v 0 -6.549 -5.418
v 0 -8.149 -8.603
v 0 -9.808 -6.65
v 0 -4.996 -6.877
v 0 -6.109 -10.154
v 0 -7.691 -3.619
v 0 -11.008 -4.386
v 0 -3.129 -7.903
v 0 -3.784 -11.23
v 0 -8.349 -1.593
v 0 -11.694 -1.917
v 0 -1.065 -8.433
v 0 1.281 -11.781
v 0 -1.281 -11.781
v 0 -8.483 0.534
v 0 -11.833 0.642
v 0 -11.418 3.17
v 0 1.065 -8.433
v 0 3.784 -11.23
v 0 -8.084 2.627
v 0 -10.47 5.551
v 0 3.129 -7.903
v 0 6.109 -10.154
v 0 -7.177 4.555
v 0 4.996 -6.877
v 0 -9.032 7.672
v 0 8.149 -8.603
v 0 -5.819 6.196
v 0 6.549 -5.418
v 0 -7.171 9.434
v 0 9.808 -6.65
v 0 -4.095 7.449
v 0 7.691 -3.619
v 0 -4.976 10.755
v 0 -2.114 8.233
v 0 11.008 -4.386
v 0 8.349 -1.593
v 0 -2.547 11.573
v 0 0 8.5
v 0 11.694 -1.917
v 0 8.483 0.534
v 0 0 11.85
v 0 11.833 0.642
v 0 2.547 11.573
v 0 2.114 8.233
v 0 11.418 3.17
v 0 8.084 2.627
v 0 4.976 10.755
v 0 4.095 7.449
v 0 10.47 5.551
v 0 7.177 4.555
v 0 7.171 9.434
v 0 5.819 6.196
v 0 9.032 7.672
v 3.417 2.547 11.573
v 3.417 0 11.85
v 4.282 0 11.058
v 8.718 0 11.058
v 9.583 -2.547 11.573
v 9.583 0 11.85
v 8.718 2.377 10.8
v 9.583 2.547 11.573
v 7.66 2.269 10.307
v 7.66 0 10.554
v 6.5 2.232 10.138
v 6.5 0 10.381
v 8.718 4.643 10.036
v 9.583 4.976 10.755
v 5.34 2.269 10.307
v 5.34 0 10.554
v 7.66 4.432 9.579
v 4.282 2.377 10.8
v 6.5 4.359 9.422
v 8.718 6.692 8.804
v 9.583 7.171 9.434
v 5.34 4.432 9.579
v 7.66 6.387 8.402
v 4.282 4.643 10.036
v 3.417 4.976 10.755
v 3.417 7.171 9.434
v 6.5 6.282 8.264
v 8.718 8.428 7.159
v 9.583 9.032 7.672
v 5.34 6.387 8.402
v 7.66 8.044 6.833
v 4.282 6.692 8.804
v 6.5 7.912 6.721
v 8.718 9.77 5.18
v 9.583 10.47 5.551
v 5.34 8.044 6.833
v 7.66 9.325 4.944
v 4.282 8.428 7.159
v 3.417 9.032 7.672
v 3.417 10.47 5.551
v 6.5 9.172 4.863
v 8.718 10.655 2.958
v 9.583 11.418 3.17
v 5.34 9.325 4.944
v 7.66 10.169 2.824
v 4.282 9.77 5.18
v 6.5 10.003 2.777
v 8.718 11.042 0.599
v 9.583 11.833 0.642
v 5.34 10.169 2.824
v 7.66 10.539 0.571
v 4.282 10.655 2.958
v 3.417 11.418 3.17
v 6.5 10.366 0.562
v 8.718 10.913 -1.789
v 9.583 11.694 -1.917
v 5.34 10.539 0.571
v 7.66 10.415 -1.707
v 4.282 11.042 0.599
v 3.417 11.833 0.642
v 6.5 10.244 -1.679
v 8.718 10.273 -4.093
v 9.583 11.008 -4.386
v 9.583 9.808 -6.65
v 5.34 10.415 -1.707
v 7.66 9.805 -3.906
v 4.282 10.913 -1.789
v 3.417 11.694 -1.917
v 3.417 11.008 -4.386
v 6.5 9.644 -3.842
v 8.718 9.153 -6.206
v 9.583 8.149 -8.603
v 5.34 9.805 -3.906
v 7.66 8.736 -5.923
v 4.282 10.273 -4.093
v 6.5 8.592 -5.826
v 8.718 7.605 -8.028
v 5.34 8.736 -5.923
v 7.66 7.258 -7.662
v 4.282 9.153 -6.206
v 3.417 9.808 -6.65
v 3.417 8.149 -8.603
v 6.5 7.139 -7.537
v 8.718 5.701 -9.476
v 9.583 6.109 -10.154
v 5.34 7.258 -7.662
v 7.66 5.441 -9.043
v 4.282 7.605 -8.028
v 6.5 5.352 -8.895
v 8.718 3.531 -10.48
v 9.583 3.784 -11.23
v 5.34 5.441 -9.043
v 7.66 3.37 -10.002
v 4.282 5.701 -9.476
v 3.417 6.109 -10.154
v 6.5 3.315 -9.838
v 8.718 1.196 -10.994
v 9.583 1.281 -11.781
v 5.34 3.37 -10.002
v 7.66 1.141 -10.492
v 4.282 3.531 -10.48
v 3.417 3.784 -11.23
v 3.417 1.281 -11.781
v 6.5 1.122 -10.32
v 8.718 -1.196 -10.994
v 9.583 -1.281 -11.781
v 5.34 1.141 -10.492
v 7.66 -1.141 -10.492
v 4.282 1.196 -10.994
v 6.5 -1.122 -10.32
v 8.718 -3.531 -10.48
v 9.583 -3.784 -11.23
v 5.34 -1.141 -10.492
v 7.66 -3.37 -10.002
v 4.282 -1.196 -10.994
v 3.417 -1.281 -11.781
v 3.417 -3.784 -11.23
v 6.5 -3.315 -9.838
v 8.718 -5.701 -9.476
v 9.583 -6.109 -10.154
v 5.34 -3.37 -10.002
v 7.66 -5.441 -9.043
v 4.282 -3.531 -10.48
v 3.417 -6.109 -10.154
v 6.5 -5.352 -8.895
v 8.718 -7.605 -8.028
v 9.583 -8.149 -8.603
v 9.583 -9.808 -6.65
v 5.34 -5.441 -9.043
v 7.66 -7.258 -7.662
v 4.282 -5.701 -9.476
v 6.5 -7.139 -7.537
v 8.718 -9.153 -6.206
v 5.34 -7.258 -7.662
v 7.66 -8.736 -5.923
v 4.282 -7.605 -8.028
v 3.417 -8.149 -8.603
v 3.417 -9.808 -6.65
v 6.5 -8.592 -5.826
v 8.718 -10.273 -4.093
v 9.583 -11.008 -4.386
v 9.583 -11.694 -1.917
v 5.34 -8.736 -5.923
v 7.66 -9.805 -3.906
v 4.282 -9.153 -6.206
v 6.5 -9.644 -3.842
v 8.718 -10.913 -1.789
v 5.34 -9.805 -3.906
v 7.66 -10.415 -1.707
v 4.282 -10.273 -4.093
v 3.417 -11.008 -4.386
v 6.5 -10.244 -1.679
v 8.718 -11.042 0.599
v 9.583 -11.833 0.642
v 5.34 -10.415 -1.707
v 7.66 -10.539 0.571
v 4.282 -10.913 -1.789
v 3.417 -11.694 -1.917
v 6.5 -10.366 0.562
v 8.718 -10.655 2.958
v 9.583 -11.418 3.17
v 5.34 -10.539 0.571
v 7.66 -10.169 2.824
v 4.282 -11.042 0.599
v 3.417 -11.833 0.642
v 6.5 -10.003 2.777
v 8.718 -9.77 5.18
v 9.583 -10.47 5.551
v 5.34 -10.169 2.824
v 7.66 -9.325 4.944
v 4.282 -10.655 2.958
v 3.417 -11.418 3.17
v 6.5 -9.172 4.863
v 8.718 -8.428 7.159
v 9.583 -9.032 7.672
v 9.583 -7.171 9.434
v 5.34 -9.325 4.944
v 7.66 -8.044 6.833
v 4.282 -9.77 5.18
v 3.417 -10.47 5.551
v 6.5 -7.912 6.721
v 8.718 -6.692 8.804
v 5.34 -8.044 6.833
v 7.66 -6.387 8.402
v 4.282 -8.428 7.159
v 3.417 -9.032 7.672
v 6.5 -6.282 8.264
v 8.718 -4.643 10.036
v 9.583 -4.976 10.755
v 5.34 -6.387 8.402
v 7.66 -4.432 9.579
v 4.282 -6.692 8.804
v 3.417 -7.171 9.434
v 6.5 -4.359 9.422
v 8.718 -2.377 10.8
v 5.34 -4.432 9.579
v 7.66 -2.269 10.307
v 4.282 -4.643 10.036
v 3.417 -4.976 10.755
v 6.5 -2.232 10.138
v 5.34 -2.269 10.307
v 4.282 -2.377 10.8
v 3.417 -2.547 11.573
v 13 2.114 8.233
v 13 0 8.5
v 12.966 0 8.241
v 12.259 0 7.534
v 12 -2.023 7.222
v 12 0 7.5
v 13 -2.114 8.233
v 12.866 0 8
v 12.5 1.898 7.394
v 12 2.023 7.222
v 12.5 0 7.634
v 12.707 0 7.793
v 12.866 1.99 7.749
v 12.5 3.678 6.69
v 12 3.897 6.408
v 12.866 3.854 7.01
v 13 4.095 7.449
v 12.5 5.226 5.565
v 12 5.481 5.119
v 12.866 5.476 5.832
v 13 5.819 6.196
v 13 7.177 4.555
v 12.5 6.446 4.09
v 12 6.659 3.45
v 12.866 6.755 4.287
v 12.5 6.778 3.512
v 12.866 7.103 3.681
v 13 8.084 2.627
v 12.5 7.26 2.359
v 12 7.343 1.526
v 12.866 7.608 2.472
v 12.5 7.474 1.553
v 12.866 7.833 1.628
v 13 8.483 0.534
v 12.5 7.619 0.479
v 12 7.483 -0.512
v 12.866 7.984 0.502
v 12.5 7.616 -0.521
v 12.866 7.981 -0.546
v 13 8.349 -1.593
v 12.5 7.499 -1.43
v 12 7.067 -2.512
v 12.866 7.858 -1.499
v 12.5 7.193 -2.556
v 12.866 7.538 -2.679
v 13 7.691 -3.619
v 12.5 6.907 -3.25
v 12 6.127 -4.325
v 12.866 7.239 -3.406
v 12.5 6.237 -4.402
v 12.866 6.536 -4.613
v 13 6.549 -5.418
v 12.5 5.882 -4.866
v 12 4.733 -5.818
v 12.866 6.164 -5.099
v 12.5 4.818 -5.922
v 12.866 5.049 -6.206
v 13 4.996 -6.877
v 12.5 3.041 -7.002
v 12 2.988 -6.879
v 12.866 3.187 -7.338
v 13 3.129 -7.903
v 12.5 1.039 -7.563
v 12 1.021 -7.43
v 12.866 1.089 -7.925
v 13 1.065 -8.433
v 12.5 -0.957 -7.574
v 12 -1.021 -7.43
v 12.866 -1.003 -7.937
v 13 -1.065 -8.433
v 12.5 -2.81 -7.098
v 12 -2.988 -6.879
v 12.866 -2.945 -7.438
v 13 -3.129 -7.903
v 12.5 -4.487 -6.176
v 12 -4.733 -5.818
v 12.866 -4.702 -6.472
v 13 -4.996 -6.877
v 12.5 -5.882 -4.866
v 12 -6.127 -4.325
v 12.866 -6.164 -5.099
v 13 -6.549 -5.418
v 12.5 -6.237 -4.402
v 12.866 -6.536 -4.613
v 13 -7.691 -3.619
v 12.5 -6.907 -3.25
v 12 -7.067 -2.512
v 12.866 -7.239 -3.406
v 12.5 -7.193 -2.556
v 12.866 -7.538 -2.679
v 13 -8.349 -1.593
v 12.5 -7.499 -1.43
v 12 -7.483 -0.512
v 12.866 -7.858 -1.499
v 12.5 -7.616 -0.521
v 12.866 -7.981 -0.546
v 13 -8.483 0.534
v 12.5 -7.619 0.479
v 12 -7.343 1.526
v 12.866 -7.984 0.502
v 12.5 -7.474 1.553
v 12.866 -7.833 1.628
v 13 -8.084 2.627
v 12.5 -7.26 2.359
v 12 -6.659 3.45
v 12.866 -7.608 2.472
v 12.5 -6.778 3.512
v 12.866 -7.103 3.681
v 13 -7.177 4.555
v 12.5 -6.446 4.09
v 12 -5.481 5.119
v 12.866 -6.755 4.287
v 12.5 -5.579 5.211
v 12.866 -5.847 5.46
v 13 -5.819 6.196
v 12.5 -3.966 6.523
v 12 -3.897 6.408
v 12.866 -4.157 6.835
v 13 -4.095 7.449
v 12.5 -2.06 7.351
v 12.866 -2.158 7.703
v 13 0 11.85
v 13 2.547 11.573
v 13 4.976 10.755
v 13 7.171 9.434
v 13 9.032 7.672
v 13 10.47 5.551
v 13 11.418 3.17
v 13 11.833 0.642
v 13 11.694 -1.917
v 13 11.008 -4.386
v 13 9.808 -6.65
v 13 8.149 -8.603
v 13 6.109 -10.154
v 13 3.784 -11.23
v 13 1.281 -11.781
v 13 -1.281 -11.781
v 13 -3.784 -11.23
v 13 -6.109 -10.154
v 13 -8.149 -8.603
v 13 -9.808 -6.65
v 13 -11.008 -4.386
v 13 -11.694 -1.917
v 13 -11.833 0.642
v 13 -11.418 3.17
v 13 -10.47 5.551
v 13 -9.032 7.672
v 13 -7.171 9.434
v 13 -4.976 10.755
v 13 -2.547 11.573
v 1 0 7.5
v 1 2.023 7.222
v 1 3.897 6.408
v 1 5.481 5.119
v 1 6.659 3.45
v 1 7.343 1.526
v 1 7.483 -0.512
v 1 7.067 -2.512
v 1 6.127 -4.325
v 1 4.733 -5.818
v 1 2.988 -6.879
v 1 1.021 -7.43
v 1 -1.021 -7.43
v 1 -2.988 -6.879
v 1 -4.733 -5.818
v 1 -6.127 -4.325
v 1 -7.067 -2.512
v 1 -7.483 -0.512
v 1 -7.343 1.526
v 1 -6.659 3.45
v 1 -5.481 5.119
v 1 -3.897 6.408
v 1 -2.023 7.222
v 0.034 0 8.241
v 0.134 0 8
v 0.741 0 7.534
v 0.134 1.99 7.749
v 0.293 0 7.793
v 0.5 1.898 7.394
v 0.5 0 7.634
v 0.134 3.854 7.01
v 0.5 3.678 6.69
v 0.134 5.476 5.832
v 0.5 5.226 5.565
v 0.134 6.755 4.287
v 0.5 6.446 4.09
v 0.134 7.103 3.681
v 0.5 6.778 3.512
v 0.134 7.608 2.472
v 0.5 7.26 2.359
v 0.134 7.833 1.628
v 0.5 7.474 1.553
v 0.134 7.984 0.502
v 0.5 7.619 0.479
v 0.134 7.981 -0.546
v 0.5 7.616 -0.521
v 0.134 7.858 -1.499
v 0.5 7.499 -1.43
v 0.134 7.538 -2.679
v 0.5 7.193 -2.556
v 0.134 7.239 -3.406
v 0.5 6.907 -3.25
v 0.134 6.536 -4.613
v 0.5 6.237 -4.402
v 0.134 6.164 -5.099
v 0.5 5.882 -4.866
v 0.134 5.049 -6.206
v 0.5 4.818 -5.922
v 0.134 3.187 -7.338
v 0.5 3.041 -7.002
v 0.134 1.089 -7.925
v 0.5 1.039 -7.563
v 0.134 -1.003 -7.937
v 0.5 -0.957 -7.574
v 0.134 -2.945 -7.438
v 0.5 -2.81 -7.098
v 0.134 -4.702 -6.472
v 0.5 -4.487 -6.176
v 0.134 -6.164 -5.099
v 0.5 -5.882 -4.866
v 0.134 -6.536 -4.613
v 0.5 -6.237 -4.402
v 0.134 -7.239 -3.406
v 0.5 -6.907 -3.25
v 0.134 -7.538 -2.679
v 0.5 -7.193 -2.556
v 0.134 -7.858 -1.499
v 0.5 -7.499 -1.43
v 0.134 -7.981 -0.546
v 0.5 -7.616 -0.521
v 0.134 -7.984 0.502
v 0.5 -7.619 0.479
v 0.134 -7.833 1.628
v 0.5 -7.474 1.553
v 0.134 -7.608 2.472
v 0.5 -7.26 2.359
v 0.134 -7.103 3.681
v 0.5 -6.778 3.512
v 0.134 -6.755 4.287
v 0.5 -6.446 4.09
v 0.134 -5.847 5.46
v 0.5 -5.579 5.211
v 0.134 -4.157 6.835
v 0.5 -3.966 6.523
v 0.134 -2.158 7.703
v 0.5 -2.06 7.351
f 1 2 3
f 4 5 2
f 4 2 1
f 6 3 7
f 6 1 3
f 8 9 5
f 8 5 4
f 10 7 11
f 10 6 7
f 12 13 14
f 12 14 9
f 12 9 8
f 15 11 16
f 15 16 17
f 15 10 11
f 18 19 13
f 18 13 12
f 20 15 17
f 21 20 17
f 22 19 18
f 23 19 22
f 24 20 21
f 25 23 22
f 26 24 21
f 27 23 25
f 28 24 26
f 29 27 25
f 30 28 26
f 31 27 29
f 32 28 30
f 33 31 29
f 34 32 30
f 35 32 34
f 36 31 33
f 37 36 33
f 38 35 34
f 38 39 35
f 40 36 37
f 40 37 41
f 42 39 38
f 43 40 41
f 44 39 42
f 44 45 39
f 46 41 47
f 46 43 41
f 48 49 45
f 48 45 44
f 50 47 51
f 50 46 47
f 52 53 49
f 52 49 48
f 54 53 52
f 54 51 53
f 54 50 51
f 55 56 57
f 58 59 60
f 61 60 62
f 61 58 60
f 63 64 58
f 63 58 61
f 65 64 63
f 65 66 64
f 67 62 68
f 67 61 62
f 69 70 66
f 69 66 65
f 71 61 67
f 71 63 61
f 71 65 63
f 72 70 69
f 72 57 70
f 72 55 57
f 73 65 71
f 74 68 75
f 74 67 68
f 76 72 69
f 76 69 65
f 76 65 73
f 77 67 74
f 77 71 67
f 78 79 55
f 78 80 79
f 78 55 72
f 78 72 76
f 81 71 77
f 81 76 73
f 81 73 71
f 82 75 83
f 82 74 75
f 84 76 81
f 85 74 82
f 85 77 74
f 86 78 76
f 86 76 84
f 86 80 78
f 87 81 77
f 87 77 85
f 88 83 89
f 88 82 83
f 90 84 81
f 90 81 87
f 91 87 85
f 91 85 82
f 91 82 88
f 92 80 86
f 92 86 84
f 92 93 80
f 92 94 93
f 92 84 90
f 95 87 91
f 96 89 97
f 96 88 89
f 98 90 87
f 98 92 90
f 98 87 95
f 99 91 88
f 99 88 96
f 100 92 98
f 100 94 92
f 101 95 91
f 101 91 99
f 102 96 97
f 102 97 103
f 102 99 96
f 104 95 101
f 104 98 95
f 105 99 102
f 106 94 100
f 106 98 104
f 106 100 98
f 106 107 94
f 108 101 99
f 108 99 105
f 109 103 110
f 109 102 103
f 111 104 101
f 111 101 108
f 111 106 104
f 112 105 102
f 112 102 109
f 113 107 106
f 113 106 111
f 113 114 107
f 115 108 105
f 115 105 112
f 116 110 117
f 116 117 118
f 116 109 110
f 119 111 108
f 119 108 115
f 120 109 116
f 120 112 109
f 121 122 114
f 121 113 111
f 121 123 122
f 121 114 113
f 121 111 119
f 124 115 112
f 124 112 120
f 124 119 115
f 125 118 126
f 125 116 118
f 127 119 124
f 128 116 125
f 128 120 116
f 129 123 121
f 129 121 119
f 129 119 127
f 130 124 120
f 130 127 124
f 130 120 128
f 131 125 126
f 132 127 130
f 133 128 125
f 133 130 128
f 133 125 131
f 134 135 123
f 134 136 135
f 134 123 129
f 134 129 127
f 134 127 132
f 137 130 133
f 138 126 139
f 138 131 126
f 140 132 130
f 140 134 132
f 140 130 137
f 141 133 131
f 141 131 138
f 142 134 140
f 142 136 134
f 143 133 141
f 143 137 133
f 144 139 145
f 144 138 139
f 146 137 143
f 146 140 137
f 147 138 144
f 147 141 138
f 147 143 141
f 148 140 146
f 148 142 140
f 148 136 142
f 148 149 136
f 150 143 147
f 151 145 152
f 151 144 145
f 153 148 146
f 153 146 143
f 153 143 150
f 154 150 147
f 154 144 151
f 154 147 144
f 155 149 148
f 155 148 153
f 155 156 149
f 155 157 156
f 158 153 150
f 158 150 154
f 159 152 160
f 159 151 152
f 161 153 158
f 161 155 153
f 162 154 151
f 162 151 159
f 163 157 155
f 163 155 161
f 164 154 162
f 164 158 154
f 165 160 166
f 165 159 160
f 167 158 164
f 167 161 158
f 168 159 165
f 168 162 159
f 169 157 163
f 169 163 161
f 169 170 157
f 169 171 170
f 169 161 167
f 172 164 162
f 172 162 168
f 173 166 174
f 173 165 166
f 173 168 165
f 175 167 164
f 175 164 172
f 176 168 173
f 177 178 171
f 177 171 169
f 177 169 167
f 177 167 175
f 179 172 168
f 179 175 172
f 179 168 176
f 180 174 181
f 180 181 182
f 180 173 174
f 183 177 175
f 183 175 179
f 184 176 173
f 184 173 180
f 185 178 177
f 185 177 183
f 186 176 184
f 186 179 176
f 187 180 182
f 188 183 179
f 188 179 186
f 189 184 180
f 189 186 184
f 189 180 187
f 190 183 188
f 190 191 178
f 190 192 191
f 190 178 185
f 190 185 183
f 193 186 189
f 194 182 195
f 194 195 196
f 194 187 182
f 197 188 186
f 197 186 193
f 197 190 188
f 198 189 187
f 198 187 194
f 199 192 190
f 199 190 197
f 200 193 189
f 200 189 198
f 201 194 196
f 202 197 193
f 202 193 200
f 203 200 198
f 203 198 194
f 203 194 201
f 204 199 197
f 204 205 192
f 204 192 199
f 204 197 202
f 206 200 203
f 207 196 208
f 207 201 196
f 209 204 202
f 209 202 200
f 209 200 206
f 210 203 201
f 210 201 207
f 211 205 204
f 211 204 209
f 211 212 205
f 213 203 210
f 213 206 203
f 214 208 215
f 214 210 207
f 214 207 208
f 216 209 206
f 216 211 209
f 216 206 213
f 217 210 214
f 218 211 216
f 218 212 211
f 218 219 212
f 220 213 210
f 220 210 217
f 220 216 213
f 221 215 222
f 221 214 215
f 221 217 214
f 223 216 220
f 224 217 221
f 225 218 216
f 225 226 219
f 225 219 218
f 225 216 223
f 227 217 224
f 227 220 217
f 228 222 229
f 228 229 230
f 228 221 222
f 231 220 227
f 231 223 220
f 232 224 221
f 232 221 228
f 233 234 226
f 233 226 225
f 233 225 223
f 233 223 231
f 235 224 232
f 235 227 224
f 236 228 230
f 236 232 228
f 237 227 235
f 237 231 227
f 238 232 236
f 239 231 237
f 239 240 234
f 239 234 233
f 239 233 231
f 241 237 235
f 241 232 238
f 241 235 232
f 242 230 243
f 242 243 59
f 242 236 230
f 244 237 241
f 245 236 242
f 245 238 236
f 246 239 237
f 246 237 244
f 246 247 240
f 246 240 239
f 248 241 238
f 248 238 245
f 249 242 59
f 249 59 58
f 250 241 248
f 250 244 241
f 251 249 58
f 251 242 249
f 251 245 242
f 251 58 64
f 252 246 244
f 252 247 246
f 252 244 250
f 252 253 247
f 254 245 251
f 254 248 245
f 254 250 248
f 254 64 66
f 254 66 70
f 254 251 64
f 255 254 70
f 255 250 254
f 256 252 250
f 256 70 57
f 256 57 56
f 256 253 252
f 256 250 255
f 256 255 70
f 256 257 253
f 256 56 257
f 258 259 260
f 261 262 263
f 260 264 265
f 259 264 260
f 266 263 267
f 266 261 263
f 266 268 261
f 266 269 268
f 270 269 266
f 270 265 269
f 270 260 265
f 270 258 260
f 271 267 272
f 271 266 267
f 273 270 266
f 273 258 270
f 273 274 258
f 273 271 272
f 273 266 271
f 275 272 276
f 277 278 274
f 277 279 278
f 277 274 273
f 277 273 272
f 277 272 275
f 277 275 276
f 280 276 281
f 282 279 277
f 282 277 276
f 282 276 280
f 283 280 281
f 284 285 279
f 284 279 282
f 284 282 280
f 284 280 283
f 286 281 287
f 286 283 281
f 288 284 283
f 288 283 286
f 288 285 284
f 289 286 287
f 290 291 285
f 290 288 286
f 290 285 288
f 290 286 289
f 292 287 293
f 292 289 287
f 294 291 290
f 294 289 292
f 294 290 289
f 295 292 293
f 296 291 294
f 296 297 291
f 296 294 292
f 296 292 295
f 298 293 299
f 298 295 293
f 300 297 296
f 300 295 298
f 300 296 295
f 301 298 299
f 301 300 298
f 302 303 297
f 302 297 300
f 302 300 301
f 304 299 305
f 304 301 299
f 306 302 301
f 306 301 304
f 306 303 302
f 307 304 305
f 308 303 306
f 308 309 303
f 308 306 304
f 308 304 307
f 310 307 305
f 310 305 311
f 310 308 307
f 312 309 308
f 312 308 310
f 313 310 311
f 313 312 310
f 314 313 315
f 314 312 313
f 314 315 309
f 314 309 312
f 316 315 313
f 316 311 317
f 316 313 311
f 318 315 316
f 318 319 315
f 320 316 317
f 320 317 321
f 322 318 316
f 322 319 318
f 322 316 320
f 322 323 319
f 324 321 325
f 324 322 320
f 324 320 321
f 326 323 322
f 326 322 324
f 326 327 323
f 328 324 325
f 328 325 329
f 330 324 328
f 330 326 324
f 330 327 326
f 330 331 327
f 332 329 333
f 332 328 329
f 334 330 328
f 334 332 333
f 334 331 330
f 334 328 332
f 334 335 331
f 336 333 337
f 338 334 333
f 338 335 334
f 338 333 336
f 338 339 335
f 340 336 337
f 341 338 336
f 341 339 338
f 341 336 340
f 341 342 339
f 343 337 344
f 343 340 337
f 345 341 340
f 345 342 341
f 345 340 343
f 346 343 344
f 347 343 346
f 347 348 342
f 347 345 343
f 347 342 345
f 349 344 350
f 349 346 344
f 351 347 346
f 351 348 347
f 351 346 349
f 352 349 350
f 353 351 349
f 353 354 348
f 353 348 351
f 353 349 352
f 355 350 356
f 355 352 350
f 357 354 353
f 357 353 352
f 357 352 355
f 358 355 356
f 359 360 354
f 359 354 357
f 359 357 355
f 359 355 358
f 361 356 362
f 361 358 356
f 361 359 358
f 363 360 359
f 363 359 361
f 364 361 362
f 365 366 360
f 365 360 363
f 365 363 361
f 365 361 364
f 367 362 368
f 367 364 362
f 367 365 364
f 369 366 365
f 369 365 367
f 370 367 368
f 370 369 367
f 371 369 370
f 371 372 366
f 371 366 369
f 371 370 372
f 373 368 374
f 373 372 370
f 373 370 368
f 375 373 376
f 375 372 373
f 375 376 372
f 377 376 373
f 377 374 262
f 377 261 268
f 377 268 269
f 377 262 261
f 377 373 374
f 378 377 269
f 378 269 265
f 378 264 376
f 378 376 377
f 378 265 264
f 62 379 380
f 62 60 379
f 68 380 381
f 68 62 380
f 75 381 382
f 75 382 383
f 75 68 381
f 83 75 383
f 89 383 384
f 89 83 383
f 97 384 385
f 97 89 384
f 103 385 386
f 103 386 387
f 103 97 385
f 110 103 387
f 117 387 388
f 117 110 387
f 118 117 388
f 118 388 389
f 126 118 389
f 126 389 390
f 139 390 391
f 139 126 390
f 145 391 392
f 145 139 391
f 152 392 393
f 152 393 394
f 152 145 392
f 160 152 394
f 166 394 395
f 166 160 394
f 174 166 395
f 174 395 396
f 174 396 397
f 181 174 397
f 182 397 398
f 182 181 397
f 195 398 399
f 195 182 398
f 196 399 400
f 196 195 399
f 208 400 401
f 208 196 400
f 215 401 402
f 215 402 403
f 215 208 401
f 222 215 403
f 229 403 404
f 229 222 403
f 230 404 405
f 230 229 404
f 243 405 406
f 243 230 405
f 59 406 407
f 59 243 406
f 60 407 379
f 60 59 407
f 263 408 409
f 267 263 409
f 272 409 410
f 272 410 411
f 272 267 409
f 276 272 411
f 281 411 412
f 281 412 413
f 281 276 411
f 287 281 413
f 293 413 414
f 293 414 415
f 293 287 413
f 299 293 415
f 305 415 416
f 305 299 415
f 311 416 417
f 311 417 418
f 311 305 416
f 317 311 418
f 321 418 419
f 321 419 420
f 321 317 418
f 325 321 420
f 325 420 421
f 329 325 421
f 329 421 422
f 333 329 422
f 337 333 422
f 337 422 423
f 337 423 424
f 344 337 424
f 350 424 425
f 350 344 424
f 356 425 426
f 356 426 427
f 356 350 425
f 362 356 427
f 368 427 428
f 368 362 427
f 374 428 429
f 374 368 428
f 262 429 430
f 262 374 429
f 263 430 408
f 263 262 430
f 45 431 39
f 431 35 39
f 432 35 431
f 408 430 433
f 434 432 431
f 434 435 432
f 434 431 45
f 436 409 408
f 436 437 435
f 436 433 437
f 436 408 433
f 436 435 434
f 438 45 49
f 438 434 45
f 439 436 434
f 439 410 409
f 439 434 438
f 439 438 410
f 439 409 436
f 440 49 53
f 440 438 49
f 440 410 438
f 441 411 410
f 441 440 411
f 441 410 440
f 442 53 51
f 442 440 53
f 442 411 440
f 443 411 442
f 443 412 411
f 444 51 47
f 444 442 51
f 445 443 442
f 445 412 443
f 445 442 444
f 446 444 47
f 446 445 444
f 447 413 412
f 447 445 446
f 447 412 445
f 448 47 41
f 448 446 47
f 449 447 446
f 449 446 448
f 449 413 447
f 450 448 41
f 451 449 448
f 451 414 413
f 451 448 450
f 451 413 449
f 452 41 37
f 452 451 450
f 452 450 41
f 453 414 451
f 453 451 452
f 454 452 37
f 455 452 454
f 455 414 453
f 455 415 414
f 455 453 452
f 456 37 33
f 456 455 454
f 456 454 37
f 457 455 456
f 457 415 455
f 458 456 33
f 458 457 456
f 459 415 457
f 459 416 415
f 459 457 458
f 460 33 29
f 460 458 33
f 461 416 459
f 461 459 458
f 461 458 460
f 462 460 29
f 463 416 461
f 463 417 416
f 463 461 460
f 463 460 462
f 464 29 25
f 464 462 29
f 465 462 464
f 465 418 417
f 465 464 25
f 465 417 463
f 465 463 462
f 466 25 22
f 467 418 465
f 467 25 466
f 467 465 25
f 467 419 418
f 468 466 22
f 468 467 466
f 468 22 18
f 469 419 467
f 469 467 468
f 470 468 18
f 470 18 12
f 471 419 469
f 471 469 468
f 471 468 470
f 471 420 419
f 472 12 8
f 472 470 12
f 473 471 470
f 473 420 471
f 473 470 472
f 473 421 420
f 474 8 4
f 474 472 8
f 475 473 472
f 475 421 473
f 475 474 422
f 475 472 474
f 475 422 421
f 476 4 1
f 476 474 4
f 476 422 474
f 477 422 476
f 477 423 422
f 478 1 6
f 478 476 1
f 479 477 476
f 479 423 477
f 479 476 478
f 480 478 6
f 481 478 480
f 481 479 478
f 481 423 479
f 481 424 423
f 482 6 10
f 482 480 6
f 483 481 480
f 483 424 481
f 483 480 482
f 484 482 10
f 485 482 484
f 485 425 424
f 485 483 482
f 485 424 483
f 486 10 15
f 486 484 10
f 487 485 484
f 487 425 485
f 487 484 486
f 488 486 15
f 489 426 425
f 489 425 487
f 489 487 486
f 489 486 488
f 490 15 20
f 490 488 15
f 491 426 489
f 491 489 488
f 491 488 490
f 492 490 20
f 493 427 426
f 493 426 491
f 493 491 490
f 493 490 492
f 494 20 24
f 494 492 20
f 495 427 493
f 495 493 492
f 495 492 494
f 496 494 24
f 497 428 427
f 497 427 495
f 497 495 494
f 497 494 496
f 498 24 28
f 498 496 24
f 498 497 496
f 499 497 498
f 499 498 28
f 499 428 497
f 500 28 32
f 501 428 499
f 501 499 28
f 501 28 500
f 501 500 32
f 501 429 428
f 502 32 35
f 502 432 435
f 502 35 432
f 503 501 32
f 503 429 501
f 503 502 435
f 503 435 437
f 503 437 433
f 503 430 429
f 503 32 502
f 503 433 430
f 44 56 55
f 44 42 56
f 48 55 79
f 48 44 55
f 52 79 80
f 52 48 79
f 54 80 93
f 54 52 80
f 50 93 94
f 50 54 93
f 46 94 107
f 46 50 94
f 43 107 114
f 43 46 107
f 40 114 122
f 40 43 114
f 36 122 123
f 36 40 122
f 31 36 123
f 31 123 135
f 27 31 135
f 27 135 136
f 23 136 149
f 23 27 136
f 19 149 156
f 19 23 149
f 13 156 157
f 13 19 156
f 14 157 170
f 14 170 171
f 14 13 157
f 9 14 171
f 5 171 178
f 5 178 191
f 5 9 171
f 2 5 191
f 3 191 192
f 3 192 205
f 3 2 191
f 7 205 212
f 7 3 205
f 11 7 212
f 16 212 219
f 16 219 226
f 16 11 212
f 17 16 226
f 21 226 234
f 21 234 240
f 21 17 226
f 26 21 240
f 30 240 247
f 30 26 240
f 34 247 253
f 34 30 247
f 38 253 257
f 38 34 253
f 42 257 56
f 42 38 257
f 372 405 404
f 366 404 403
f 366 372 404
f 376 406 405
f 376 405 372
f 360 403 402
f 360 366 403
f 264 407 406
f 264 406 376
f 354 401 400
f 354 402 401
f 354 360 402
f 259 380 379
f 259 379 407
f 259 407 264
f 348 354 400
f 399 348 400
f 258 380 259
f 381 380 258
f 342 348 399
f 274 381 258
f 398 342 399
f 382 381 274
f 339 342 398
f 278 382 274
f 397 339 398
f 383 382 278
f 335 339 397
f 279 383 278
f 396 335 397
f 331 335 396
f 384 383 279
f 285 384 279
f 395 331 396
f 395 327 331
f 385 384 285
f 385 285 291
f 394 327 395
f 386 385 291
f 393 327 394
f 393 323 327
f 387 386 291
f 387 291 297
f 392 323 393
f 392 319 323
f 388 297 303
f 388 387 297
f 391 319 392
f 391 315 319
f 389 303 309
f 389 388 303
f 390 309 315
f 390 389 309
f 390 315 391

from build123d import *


with BuildPart() as part:
    # Sketch1 → Revolução1 (revolve)
    with BuildSketch(Plane.XY, mode=Mode.PRIVATE) as revolu_o1_sk:
        with BuildLine():
            Line((1, 7.5), (12, 7.5))
            ThreePointArc((12, 7.5), (12.707106781, 7.792893219), (13, 8.5))
            Line((13, 8.5), (13, 11.85))
            Line((13, 11.85), (9.582687302, 11.85))
            ThreePointArc((9.582687302, 11.85), (6.5, 10.381), (3.417312698, 11.85))
            Line((3.417312698, 11.85), (0, 11.85))
            Line((0, 11.85), (0, 8.5))
            ThreePointArc((0, 8.5), (0.292893219, 7.792893219), (1, 7.5))
        make_face()
    revolve(revolu_o1_sk.sketch.rotate(Axis((50, 0, 0), (-1, 0, 0)), 270), axis=Axis((50, 0, 0), (-1, 0, 0)))


solid = part.part
